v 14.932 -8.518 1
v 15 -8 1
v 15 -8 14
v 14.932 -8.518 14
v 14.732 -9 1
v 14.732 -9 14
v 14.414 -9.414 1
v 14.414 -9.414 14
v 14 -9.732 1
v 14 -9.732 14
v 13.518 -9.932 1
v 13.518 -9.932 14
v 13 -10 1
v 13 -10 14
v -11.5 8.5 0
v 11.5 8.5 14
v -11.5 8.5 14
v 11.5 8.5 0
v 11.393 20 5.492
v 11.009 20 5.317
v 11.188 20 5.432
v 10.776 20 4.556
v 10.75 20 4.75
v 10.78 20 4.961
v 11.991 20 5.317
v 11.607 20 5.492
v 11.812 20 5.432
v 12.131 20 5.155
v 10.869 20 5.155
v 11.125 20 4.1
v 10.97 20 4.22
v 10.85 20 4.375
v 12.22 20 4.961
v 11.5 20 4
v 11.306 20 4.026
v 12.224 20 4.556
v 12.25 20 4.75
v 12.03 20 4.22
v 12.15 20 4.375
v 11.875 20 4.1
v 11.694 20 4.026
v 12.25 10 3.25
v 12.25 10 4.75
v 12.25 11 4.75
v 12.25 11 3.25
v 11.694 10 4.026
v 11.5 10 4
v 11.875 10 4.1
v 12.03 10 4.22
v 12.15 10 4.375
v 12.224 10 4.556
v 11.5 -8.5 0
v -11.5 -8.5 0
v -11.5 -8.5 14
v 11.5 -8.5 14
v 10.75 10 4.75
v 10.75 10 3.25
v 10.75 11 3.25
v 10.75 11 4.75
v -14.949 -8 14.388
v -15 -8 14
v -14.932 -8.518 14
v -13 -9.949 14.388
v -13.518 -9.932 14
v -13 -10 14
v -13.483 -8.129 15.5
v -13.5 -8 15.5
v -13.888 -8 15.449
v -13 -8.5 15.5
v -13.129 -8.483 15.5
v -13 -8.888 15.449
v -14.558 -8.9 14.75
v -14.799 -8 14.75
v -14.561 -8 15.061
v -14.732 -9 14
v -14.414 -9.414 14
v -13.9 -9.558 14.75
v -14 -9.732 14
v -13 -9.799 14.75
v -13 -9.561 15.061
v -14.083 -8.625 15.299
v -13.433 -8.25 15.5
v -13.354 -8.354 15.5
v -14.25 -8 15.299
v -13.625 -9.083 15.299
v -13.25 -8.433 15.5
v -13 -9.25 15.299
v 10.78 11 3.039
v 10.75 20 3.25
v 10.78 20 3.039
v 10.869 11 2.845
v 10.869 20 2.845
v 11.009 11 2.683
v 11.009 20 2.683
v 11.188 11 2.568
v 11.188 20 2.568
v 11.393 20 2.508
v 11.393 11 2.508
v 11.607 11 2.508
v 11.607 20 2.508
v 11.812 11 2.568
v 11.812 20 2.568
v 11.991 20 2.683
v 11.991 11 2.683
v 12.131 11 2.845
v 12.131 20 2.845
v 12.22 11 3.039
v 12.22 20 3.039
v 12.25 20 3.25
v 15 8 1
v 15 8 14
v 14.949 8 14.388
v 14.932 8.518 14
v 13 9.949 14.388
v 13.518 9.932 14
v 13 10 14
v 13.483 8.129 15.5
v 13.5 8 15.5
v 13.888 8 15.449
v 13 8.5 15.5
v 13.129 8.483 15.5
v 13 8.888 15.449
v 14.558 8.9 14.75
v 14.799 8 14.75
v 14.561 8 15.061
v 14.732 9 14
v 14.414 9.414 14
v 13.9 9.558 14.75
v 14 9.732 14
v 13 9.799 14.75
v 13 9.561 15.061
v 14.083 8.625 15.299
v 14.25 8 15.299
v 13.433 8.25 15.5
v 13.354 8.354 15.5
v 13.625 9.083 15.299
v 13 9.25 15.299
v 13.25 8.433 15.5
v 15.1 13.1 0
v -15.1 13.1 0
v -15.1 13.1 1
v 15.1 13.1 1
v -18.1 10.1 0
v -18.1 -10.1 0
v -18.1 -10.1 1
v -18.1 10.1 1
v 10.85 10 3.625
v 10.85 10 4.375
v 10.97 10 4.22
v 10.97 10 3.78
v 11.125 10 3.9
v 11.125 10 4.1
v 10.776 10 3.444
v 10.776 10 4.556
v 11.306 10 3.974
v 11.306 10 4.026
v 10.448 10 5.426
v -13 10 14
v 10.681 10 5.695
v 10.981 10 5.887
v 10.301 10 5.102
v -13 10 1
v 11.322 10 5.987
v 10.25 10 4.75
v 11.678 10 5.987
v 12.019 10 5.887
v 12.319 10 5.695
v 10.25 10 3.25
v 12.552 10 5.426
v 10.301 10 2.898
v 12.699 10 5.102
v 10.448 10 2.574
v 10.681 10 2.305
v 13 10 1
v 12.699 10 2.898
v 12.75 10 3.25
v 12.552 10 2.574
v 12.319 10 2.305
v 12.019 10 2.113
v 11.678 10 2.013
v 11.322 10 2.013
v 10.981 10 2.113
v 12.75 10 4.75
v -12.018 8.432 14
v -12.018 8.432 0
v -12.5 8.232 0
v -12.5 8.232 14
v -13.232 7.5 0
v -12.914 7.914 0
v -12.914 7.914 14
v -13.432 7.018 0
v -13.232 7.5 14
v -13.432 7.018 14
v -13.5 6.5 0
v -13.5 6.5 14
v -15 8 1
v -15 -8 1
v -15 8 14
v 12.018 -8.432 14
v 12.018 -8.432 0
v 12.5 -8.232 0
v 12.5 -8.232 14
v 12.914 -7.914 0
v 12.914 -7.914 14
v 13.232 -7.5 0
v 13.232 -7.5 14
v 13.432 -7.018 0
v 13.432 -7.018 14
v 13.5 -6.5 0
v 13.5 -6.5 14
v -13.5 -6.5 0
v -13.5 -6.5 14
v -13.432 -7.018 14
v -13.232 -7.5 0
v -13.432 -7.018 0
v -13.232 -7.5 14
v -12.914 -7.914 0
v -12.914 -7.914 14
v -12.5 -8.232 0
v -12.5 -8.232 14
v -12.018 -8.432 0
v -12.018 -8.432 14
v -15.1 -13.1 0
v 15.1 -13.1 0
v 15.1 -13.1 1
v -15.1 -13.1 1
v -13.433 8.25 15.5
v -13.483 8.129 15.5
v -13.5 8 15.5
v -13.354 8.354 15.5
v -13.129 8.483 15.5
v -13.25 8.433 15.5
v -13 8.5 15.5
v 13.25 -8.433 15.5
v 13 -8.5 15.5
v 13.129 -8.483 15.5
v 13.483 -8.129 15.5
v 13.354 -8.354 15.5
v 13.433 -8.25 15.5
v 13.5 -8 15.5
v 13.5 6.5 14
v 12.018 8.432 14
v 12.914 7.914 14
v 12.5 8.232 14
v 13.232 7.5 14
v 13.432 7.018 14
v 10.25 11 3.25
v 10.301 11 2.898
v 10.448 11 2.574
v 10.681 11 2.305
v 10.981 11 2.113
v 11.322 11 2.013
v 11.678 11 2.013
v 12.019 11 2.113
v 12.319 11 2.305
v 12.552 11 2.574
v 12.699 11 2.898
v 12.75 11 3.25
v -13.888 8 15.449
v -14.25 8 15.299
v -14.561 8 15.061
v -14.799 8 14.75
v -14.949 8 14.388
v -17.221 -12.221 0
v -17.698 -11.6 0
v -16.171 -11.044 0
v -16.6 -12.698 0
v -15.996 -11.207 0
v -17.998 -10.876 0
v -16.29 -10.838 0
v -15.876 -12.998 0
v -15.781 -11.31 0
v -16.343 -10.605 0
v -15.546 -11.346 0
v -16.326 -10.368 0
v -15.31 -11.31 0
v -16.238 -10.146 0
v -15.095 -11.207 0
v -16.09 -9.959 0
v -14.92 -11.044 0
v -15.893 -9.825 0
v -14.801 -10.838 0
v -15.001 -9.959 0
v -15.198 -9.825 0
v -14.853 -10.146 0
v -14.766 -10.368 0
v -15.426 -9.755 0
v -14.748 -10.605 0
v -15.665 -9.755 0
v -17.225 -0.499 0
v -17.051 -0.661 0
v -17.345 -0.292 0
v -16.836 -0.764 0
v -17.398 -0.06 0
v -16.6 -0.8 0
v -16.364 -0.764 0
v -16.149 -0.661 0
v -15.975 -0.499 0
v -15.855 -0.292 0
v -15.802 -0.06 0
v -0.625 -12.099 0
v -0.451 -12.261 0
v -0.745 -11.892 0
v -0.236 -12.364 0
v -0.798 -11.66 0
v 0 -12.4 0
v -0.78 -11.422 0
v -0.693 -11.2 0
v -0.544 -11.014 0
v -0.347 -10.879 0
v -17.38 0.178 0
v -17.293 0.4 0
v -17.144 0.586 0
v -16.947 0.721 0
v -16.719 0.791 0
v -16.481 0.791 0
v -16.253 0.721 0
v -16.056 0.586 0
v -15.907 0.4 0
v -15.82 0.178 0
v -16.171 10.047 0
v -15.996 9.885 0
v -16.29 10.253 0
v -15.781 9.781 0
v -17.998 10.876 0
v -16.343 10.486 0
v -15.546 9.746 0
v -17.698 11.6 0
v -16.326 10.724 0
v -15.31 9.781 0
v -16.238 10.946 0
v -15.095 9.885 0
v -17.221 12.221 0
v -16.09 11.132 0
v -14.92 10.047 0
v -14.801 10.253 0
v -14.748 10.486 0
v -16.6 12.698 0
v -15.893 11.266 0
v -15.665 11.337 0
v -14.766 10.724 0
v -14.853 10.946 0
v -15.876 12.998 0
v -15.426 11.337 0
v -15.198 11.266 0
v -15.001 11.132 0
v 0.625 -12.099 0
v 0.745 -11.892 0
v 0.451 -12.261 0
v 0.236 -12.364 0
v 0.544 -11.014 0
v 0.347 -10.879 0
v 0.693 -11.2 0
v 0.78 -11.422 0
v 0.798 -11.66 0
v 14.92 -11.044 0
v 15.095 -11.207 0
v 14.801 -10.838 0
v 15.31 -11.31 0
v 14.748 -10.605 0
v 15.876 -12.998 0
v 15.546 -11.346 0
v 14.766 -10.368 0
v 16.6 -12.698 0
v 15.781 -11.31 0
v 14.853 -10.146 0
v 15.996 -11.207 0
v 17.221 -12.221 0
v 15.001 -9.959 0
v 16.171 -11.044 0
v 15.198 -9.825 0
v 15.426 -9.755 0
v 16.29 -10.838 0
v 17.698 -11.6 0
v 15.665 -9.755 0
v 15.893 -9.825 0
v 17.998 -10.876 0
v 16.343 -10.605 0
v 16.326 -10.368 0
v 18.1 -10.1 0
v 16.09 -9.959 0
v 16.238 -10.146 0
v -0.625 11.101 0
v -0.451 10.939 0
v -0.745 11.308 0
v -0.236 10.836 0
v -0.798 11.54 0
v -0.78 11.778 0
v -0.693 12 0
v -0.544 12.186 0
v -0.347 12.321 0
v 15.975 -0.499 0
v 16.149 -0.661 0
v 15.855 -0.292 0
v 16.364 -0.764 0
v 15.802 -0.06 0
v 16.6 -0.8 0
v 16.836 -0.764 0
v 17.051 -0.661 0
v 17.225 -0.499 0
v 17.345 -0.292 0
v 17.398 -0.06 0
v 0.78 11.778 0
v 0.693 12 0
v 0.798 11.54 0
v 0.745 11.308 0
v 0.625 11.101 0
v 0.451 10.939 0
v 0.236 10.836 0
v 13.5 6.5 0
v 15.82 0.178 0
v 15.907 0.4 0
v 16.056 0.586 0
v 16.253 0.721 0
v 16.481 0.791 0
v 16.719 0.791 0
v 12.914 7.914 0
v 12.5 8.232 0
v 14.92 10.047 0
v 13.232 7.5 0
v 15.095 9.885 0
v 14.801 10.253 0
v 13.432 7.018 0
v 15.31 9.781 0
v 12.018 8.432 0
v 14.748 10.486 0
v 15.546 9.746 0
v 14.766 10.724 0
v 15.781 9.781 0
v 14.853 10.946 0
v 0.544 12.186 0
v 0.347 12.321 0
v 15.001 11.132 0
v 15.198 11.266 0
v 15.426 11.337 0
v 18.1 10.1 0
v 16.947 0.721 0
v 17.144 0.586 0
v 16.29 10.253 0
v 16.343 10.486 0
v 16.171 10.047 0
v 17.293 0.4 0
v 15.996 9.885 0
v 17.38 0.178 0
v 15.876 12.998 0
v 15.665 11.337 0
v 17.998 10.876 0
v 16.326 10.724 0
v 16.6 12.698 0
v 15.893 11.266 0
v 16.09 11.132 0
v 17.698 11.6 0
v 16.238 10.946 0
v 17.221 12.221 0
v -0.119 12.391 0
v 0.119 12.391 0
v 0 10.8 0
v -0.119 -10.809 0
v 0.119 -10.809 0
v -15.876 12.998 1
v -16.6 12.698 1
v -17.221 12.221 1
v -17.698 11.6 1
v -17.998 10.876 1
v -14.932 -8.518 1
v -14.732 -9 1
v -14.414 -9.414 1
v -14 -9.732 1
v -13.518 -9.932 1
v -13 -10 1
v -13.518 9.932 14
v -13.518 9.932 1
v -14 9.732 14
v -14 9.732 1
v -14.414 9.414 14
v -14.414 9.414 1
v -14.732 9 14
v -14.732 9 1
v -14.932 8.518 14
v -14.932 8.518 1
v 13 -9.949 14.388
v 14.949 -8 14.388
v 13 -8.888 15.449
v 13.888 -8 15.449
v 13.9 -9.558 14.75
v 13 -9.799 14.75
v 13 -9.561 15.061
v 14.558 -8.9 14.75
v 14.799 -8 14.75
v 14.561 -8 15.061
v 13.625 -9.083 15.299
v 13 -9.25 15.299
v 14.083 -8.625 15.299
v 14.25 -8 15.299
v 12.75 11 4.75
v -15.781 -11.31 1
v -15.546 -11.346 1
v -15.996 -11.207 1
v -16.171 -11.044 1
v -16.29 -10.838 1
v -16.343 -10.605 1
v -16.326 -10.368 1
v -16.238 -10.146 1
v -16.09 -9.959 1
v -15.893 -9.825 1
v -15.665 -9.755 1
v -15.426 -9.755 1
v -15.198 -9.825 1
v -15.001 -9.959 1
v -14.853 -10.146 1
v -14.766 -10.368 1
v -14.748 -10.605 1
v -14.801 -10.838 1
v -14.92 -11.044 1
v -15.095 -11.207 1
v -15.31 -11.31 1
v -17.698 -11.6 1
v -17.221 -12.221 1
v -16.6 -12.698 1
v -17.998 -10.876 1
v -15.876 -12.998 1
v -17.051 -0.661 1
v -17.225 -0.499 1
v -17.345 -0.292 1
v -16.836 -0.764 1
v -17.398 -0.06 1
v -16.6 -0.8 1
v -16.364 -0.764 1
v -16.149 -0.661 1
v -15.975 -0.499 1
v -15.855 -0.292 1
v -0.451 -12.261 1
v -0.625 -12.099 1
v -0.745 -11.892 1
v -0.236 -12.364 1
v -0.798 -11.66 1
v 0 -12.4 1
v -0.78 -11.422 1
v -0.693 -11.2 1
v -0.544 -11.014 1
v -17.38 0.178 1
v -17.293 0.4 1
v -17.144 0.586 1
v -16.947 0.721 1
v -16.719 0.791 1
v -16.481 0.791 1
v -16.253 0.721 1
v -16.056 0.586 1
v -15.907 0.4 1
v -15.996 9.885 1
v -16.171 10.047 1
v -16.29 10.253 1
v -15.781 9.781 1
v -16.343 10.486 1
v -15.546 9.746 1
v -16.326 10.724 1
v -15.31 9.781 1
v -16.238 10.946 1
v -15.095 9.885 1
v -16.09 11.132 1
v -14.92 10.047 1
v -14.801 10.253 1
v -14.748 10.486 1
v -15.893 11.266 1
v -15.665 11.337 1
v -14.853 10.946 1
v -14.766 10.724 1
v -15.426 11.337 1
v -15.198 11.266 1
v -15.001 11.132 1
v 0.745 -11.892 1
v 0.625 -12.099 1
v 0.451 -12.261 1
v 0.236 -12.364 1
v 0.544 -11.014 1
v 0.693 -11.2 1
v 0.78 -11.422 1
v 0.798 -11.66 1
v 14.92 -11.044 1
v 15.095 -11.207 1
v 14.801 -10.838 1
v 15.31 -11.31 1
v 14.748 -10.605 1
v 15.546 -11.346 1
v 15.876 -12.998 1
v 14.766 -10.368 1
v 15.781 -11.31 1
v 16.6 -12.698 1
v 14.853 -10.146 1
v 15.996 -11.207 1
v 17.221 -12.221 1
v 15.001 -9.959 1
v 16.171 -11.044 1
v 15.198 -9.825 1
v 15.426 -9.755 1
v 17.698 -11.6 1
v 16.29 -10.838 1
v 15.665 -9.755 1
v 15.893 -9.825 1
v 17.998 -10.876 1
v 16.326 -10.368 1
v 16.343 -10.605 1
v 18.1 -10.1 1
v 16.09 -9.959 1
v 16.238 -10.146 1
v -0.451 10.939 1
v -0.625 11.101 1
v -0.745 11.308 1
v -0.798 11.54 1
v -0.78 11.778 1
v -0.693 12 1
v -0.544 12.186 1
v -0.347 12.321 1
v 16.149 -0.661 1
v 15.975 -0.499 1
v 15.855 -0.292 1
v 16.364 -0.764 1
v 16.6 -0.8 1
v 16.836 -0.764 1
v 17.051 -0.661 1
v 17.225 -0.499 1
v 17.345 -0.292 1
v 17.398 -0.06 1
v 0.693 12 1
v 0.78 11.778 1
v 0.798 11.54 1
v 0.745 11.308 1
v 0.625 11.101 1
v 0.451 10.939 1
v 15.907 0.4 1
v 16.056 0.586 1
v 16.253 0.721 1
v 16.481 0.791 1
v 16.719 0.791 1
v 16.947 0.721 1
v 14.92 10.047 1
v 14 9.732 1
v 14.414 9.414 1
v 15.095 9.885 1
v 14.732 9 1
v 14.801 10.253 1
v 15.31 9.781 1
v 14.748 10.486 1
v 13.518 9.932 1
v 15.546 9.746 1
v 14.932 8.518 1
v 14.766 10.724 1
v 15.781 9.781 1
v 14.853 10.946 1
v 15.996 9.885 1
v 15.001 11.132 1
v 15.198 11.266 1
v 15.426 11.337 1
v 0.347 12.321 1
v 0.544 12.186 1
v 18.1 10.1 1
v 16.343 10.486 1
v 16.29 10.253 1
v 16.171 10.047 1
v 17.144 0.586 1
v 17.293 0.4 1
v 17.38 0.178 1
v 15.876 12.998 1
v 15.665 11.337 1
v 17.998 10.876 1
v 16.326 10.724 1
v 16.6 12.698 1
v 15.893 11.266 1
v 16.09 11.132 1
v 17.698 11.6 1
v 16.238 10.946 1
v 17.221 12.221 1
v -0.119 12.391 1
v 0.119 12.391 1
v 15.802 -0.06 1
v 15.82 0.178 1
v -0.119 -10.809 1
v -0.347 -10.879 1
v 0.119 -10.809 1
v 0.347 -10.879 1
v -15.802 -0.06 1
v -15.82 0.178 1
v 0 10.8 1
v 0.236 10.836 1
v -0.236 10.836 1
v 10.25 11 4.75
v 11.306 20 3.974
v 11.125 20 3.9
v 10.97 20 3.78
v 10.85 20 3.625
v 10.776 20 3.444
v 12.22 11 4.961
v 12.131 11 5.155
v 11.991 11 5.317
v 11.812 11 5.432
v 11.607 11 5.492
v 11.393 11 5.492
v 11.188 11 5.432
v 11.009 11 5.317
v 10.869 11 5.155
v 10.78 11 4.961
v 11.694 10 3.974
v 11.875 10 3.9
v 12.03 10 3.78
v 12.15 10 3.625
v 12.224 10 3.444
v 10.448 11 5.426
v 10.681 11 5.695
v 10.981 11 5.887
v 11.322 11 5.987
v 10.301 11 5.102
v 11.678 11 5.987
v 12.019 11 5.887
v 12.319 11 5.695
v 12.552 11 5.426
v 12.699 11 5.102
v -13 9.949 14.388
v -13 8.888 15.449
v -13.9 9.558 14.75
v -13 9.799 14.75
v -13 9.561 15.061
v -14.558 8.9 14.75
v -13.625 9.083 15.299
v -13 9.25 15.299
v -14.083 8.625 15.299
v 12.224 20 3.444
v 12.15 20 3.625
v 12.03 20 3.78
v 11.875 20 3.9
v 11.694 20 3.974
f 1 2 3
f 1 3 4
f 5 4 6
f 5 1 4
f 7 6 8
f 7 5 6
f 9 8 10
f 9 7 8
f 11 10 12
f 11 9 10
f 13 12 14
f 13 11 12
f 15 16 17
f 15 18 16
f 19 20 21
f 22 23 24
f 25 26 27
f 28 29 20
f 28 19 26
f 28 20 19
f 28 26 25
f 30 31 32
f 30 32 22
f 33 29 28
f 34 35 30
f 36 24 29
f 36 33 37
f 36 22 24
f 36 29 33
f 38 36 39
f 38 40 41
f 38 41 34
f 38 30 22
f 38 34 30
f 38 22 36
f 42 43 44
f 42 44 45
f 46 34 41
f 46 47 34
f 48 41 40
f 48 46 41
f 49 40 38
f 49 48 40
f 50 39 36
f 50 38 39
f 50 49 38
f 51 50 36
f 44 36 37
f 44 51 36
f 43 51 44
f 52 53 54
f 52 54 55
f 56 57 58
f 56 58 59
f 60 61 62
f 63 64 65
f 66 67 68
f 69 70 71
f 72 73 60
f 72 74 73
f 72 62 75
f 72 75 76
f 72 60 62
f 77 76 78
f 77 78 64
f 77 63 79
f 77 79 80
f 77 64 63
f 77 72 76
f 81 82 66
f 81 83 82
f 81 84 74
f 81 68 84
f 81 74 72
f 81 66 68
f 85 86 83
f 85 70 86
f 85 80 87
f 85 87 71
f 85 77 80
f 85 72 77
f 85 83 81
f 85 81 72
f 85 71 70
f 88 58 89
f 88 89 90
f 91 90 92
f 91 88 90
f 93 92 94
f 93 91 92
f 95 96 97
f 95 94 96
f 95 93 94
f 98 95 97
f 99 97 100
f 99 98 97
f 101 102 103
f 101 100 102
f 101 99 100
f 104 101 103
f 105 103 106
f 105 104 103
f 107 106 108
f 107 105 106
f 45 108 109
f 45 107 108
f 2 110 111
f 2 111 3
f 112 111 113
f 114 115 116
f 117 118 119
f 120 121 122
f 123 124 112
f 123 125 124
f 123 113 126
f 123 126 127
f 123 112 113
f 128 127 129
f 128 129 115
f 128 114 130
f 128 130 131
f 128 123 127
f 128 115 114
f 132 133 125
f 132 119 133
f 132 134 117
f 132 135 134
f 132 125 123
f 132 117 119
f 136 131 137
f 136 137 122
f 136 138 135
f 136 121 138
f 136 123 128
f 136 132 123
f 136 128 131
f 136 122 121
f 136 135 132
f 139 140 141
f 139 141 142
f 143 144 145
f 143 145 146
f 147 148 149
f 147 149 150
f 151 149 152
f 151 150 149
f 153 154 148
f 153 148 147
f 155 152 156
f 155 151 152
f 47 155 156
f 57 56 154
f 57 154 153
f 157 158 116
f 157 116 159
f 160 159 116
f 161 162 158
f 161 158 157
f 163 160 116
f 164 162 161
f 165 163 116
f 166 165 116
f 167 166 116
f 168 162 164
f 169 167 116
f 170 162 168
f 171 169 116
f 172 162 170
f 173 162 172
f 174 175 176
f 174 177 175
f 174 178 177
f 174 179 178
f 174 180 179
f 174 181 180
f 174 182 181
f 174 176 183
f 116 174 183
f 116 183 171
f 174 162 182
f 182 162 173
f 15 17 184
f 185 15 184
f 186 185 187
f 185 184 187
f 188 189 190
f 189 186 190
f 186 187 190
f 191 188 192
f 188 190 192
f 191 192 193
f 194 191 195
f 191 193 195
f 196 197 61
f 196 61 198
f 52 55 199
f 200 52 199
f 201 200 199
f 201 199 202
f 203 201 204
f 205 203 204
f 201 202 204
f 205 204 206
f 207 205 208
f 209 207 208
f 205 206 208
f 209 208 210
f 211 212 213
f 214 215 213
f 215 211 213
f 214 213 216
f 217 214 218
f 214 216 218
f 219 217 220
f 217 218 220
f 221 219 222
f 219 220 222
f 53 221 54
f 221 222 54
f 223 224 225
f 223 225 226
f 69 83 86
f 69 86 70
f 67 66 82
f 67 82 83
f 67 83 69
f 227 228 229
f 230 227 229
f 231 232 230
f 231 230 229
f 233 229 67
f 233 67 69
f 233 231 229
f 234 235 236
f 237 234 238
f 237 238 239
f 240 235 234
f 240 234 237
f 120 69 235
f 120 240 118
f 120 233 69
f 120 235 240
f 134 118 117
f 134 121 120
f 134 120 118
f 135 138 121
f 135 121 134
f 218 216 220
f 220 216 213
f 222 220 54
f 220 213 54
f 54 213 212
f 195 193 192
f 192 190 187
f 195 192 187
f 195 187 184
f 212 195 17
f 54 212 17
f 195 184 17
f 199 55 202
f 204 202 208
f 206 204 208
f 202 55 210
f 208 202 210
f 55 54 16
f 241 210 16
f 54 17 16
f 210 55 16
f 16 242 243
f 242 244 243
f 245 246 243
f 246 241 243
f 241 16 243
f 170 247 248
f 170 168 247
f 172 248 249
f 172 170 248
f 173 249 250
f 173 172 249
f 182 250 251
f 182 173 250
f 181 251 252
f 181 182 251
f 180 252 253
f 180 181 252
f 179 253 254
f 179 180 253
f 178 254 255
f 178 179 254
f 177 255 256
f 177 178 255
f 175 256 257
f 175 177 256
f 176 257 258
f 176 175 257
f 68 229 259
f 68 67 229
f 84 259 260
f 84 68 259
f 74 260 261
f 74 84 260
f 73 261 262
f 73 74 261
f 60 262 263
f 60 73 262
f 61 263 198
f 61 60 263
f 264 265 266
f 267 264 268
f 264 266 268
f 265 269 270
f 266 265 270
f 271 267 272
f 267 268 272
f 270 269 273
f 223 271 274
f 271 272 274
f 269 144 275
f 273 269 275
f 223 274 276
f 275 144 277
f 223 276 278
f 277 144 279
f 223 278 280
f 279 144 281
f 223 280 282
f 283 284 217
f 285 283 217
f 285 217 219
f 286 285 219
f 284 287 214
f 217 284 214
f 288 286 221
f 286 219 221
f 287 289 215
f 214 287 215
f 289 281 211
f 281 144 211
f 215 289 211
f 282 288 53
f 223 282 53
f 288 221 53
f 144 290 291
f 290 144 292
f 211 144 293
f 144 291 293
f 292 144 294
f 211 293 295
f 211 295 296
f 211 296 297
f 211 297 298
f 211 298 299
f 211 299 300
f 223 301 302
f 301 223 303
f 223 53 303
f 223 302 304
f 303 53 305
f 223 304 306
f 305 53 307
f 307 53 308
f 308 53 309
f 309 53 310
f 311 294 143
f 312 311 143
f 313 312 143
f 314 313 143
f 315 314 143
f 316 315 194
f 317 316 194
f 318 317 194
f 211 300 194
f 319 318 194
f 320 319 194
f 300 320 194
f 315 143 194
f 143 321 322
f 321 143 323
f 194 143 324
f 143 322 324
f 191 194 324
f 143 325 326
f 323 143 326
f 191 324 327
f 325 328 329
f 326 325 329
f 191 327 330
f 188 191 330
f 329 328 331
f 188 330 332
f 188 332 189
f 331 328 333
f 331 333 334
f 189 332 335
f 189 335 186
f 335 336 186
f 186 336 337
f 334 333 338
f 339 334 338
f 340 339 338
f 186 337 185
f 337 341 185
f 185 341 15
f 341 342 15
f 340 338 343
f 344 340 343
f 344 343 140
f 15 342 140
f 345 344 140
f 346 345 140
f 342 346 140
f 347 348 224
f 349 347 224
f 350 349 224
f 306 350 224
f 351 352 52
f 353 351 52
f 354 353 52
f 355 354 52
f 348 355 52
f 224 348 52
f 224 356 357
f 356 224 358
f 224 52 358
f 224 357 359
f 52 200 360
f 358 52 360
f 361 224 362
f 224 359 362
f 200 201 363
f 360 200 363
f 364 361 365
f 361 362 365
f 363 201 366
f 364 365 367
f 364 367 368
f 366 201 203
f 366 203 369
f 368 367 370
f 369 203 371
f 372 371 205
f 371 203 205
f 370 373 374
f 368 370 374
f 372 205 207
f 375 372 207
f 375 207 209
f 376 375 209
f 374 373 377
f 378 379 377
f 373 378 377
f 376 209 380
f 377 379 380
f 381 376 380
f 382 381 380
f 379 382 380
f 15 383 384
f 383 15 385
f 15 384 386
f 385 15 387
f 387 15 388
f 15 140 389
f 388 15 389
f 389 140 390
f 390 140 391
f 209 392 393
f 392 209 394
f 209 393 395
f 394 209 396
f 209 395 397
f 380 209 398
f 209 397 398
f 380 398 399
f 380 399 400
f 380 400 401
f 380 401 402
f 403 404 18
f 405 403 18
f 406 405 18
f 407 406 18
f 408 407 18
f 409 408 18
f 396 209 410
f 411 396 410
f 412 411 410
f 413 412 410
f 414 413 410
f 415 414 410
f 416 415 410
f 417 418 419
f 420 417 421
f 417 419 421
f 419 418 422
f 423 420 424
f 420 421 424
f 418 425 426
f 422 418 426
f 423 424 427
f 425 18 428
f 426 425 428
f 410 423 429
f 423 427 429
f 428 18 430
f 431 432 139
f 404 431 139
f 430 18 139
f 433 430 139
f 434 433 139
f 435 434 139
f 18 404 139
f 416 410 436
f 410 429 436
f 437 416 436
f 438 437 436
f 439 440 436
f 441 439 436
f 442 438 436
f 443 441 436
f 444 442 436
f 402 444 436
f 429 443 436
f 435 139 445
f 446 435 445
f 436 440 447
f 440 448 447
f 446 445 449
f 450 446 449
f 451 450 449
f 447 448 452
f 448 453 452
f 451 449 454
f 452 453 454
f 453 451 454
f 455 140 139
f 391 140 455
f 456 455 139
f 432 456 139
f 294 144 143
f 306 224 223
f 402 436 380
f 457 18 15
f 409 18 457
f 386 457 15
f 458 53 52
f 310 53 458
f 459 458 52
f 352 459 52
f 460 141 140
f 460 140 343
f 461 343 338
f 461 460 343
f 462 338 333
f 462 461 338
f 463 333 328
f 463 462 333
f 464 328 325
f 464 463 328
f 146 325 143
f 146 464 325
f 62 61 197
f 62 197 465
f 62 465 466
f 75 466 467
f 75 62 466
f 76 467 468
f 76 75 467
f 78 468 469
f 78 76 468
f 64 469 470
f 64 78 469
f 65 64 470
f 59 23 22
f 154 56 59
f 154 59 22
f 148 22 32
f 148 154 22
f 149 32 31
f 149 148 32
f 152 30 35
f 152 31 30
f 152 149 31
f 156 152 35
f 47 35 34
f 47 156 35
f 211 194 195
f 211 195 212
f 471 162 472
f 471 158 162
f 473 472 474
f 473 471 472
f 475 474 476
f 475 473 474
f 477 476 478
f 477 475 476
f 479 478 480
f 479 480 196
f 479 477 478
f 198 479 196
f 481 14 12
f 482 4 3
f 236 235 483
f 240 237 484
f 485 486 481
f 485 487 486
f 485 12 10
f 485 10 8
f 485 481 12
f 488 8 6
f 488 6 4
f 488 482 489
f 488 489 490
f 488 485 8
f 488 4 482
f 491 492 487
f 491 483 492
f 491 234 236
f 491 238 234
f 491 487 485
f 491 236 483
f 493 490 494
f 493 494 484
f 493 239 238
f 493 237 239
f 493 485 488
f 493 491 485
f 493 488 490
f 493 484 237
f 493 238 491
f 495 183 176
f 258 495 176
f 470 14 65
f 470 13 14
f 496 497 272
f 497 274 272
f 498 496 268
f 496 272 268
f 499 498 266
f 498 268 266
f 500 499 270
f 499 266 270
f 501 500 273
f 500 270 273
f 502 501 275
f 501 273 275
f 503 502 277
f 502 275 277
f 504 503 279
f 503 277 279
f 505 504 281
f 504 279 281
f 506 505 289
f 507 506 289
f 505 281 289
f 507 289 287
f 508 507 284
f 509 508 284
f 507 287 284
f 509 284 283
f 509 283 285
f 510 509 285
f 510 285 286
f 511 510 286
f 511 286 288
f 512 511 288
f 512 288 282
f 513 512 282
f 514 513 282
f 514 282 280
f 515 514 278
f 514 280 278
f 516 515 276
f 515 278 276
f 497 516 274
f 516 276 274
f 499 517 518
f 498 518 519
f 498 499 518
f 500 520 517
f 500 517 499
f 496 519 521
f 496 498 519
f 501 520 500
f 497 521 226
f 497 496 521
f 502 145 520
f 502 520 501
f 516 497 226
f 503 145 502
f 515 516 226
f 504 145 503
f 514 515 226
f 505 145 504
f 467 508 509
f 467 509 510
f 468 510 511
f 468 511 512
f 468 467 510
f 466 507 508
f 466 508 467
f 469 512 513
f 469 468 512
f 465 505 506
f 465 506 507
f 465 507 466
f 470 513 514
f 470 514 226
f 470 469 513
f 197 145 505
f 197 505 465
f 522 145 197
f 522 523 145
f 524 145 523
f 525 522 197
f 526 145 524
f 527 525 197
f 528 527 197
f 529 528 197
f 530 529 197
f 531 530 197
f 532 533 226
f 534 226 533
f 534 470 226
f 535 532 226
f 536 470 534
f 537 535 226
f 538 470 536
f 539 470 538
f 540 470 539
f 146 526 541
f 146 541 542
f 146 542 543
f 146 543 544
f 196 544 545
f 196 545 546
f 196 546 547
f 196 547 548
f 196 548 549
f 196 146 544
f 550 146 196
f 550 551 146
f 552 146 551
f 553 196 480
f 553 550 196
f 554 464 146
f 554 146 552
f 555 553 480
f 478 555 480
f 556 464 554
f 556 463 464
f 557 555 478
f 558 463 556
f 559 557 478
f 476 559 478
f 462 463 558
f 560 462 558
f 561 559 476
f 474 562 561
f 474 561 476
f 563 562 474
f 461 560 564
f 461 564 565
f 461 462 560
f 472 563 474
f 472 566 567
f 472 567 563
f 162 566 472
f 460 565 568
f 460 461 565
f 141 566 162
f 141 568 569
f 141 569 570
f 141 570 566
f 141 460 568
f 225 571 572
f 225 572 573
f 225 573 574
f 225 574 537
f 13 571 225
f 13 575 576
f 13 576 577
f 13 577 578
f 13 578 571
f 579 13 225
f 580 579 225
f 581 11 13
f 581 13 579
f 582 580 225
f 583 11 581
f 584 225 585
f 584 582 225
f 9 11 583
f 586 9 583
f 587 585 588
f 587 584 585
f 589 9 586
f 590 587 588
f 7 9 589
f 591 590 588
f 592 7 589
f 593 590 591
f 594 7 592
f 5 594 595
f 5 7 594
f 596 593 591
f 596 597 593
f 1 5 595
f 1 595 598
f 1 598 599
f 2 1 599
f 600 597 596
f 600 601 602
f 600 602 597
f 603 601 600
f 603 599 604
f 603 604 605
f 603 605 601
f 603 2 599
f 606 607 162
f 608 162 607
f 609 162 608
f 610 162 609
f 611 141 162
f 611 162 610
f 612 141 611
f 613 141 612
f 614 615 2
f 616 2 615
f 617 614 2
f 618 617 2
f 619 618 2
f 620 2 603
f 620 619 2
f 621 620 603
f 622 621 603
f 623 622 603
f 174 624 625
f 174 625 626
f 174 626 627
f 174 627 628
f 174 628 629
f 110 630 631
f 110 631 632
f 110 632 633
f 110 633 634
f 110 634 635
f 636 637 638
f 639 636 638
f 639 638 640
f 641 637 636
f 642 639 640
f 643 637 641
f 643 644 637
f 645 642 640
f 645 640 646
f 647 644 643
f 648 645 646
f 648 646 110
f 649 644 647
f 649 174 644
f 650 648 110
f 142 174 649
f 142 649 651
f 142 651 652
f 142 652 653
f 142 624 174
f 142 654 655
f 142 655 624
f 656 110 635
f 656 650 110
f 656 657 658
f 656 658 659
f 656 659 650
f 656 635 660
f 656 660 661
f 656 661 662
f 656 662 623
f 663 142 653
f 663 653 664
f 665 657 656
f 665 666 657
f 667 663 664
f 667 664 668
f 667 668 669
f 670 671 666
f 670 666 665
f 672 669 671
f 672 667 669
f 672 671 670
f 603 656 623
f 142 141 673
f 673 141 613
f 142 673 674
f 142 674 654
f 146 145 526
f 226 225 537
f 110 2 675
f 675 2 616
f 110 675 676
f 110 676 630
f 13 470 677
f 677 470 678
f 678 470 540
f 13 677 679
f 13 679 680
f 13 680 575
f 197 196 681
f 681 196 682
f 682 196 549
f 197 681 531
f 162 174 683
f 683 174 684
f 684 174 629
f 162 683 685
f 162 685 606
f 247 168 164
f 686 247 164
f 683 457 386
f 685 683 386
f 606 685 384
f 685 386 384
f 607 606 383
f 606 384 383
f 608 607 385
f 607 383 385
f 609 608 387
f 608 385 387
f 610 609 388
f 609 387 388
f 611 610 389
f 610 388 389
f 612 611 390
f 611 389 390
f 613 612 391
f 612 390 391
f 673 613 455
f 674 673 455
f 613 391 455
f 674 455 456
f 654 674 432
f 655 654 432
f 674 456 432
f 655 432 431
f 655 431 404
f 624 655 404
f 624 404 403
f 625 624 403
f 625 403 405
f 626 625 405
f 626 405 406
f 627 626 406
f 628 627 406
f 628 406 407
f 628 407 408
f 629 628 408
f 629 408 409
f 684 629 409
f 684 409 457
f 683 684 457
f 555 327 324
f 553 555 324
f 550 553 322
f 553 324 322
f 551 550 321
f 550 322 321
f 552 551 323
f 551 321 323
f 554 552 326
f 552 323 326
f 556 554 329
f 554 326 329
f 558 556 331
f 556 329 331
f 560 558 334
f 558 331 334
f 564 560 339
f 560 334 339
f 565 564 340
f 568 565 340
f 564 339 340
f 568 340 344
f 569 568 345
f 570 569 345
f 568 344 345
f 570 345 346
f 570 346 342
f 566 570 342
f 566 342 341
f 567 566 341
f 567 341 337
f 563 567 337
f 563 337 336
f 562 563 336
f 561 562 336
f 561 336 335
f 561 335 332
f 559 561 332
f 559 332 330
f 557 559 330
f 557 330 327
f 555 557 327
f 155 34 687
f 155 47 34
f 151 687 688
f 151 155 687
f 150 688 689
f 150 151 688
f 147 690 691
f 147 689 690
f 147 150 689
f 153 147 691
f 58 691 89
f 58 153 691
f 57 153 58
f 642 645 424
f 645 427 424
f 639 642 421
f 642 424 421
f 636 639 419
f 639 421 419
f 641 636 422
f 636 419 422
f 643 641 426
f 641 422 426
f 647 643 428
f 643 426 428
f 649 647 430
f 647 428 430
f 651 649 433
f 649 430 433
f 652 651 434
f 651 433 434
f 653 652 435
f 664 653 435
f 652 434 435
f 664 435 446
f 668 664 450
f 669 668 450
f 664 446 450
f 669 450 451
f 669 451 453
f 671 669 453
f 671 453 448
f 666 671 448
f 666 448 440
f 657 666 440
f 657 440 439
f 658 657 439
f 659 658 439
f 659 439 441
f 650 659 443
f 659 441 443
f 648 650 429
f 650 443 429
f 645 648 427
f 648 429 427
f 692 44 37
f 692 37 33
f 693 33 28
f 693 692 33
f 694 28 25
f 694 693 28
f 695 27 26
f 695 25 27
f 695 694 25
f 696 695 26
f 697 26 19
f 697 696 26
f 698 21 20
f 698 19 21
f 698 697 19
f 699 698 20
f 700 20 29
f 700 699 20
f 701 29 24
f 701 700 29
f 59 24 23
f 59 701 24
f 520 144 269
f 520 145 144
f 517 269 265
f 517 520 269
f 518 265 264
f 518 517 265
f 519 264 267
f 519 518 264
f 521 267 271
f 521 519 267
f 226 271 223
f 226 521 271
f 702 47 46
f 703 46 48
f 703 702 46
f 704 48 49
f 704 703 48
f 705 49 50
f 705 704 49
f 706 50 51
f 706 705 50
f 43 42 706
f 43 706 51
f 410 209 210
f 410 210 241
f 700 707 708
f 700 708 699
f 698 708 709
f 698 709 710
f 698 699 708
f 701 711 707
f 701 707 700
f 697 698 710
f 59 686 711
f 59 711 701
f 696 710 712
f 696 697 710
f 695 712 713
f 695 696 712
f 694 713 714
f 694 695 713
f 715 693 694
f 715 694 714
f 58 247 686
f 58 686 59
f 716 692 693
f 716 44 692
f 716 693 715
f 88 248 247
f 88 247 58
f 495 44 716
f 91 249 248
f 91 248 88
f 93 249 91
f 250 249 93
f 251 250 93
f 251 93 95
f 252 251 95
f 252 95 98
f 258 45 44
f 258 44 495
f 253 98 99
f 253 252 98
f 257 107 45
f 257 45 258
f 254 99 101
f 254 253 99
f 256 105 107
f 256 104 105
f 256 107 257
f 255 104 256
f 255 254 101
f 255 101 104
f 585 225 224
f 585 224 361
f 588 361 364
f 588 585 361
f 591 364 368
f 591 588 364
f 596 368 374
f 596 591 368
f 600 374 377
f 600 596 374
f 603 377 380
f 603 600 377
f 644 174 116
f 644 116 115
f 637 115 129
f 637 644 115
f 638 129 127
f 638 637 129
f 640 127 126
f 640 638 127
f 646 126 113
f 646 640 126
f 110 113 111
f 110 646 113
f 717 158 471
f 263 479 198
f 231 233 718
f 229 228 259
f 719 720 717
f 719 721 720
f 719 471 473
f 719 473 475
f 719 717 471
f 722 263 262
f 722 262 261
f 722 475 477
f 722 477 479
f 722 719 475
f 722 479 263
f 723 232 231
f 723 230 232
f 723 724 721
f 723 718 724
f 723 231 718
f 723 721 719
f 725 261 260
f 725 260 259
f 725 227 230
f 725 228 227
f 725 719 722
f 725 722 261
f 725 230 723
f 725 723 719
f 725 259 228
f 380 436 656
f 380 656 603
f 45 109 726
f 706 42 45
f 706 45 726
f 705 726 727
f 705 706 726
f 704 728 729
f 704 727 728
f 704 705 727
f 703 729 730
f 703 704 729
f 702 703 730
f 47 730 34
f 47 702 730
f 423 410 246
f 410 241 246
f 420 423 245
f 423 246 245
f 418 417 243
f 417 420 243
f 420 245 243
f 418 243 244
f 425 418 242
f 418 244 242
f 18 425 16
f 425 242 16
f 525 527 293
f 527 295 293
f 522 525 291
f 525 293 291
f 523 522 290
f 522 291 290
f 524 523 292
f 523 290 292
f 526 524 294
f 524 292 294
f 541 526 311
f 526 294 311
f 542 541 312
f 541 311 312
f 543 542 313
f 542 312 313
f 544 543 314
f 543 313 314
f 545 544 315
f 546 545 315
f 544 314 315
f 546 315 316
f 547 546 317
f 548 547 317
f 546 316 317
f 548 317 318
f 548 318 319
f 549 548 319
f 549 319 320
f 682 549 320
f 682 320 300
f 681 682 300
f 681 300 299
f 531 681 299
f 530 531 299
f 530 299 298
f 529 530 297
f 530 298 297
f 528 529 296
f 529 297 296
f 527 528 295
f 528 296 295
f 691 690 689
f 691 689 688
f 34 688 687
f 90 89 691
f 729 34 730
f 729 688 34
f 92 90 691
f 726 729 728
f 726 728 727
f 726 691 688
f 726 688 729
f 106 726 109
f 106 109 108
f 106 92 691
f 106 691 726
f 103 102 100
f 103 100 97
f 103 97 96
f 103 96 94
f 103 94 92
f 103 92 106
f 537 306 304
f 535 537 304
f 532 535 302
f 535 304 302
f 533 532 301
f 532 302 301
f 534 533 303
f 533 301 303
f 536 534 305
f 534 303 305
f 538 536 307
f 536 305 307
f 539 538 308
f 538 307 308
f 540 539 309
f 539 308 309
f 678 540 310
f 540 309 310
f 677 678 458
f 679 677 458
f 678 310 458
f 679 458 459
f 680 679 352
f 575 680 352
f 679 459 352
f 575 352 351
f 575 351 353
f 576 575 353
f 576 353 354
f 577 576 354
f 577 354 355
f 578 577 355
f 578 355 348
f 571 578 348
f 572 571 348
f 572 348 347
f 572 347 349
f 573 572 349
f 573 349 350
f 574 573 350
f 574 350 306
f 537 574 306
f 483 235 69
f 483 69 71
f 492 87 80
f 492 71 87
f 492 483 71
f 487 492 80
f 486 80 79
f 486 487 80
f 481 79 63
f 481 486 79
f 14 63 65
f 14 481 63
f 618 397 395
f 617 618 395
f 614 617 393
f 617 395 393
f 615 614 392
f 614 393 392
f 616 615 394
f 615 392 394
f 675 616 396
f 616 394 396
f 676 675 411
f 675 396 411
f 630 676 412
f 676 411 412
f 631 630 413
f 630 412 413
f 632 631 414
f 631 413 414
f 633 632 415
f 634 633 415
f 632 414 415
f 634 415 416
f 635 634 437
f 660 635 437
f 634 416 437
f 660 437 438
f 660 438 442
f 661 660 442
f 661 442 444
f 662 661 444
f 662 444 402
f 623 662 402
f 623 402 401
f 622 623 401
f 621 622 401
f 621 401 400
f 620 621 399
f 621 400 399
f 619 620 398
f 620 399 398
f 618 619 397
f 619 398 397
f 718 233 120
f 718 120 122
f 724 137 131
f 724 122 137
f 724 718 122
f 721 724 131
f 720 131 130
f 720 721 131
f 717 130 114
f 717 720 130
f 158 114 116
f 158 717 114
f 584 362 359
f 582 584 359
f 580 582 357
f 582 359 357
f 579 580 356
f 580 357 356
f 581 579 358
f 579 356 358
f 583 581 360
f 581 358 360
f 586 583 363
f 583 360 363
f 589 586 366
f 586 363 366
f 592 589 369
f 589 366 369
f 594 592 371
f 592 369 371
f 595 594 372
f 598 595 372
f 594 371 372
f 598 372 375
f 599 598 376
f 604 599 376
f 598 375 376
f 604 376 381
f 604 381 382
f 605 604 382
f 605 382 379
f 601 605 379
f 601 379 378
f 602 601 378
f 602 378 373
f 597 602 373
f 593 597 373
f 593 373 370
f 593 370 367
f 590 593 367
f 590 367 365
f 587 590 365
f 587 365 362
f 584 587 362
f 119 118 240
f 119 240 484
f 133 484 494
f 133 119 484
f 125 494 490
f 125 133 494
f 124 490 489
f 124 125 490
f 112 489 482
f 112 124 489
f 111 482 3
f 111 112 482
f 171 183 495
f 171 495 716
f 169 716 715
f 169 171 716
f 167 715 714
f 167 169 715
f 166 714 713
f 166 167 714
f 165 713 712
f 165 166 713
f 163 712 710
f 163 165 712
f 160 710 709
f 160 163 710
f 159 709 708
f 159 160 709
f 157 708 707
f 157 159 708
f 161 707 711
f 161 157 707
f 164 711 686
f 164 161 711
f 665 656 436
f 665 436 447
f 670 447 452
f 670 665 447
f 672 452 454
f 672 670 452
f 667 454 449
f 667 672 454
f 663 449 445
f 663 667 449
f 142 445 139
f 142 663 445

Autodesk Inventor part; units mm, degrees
ref_plane "YZ Plane" through (0, 0, 0) normal (1, 0, 0) x (0, 1, 0)
ref_plane "XZ Plane" through (0, 0, 0) normal (0, 1, 0) x (-1, 0, 0)
ref_plane "XY Plane" through (0, 0, 0) normal (0, 0, 1) x (1, 0, 0)
sketch "Sketch1" plane through (0, 0, 0) normal (0, 0, 1) x (1, 0, 0)
  line L0 (-15, 10) -> (15, 10)
  line L1 (15, 10) -> (15, -10)
  line L2 (15, -10) -> (-15, -10)
  line L3 (-15, -10) -> (-15, 10)
  line L4 (-18.1, 13.1) -> (18.1, 13.1)
  line L5 (18.1, 13.1) -> (18.1, -13.1)
  line L6 (18.1, -13.1) -> (-18.1, -13.1)
  line L7 (-18.1, -13.1) -> (-18.1, 13.1)
  line L8 (16.6, 11.6) -> (-16.6, 11.6)
  line L9 (-16.6, 11.6) -> (-16.6, -11.6)
  line L10 (-16.6, -11.6) -> (16.6, -11.6)
  line L11 (16.6, -11.6) -> (16.6, 11.6)
  line L12 (13.5, 8.5) -> (-13.5, 8.5)
  line L13 (-13.5, 8.5) -> (-13.5, -8.5)
  line L14 (-13.5, -8.5) -> (13.5, -8.5)
  line L15 (13.5, -8.5) -> (13.5, 8.5)
  point P0 (0, 0)
  dimension "d0" = 20
  dimension "d1" = 30
  dimension "d2" = 3.1
  dimension "d3" = 1.6
  dimension "d4" = 1.5
  dimension "d17" = 15
  dimension "d18" = 10
extrude "Extrusion1" add sketch "Sketch1" along normal blind 1 contours L4 L5 L6 L7 | L11 L10 L9 L8
extrude "Extrusion3" add sketch "Sketch1" along normal blind 14 contours L0 L1 L2 L3
sketch "Sketch2" plane through (0, 0, 14) normal (0, 0, 1) x (1, 0, 0)
  line L0 (13.5, 8.5) -> (13.5, -8.5) projected
  line L1 (13.5, -8.5) -> (-13.5, -8.5) projected
  line L2 (-13.5, -8.5) -> (-13.5, 8.5) projected
  line L3 (-13.5, 8.5) -> (13.5, 8.5) projected
  line L4 (15, 10) -> (-15, 10) projected
  line L5 (-15, 10) -> (-15, -10) projected
  line L6 (-15, -10) -> (15, -10) projected
  line L7 (15, -10) -> (15, 10) projected
  point P0 (0, 0)
extrude "Extrusion4" add sketch "Sketch2" along normal blind 1.5 contours L0 L1 L2 L3 | L7 L6 L5 L4
fillet "Fillet1" radius 2 8 edges at (-15, 10, 8.25) (-15, -10, 8.25) (15, 10, 8.25) (15, -10, 8.25) (13.5, -8.5, 7) (-13.5, -8.5, 7) (13.5, 8.5, 7) (-13.5, 8.5, 7)
fillet "Fillet1" radius 3 4 edges at (-18.1, -13.1, 0.5) (18.1, -13.1, 0.5) (18.1, 13.1, 0.5) (-18.1, 13.1, 0.5)
fillet "Fillet2" radius 1.5 8 edges at (-14.4142, 9.4142, 15.5) (-15, 0, 15.5) (-14.4142, -9.4142, 15.5) (0, -10, 15.5) (14.4142, -9.4142, 15.5) (15, 0, 15.5) (14.4142, 9.4142, 15.5) (0, 10, 15.5)
sketch "Sketch3" plane through (0, 0, 1) normal (0, 0, 1) x (1, 0, 0)
  arc A0 (-15.1, 13.1) -> (-18.1, 10.1) centre (-15.1, 10.1) ccw projected
  line L0 (-18.1, 10.1) -> (-18.1, -10.1) projected
  arc A1 (-18.1, -10.1) -> (-15.1, -13.1) centre (-15.1, -10.1) ccw projected
  line L1 (-15.1, -13.1) -> (15.1, -13.1) projected
  arc A2 (15.1, -13.1) -> (18.1, -10.1) centre (15.1, -10.1) ccw projected
  line L2 (18.1, -10.1) -> (18.1, 10.1) projected
  arc A3 (18.1, 10.1) -> (15.1, 13.1) centre (15.1, 10.1) ccw projected
  line L3 (15.1, 13.1) -> (-15.1, 13.1) projected
  line L4 (15, 8) -> (15, -8) projected
  arc A4 (13, -10) -> (15, -8) centre (13, -8) ccw projected
  line L5 (13, -10) -> (-13, -10) projected
  arc A5 (-15, -8) -> (-13, -10) centre (-13, -8) ccw projected
  line L6 (-15, -8) -> (-15, 8) projected
  arc A6 (-13, 10) -> (-15, 8) centre (-13, 8) ccw projected
  line L7 (-13, 10) -> (13, 10) projected
  arc A7 (15, 8) -> (13, 10) centre (13, 8) ccw projected
  line L8 (16.6, -8) -> (16.6, 8)
  arc A8 (16.6, 8) -> (13, 11.6) centre (13, 8) ccw
  line L9 (13, 11.6) -> (-13, 11.6)
  arc A9 (-13, 11.6) -> (-16.6, 8) centre (-13, 8) ccw
  line L10 (-16.6, 8) -> (-16.6, -8)
  arc A10 (-16.6, -8) -> (-13, -11.6) centre (-13, -8) ccw
  line L11 (-13, -11.6) -> (13, -11.6)
  arc A11 (13, -11.6) -> (16.6, -8) centre (13, -8) ccw
  point P0 (0, 0)
  point P1 (15.5456, -10.5456)
  point P2 (0, -11.6)
  point P3 (-15.5456, -10.5456)
  point P4 (-16.6, 0)
  point P5 (16.6, 0)
  point P6 (15.5456, 10.5456)
  point P7 (0, 11.6)
  point P8 (-15.5456, 10.5456)
  dimension "d16" = 1.6
hole "Hole1" at (15.5456, -10.5456, 1) at (0, -11.6, 1) at (-15.5456, -10.5456, 1) at (-16.6, 0, 1) at (16.6, 0, 1) at (15.5456, 10.5456, 1) at (0, 11.6, 1) at (-15.5456, 10.5456, 1) direction (0, 0, -1) diameter 1.6 end through all both
sketch "Sketch4" plane through (-13, 10, 1) normal (0, 1, 0) x (1, 0, 0)
  line L0 (26, -13) -> (0, -13) projected
  line L1 (26, 0) -> (26, -13) projected
  line L2 (0, 0) -> (26, 0) projected
  line L3 (0, -13) -> (0, 0) projected
  line L4 (24.5, -3.75) -> (24.5, -2.25) construction
  line L5 (25.25, -3.75) -> (25.25, -2.25)
  line L6 (23.75, -2.25) -> (23.75, -3.75)
  arc A0 (23.75, -3.75) -> (25.25, -3.75) centre (24.5, -3.75) ccw
  arc A1 (25.25, -2.25) -> (23.75, -2.25) centre (24.5, -2.25) ccw
  line L7 (25.75, -3.75) -> (25.75, -2.25)
  arc A2 (25.75, -2.25) -> (23.25, -2.25) centre (24.5, -2.25) ccw
  line L8 (23.25, -2.25) -> (23.25, -3.75)
  arc A3 (23.25, -3.75) -> (25.75, -3.75) centre (24.5, -3.75) ccw
  circle A4 centre (24.5, -3.75) radius 0.75
  circle A5 centre (24.5, -2.25) radius 0.75
  point P0 (13, 1)
  point P1 (24.5, -3)
  dimension "d26" = 1.5
  dimension "d27" = 1.5
  dimension "d28" = 1.5
  dimension "d29" = 10
  dimension "d30" = 13
  dimension "d31" = 0.5
extrude "Extrusion5" add sketch "Sketch4" along normal blind 1 contours A3 L8 A2 L7
extrude "Extrusion6" add sketch "Sketch4" along normal blind 10 contours A0 A4 | A5 A1
properties part number "CNCM_ALU_Vibration_module_cover" material "Aluminum 6061"
